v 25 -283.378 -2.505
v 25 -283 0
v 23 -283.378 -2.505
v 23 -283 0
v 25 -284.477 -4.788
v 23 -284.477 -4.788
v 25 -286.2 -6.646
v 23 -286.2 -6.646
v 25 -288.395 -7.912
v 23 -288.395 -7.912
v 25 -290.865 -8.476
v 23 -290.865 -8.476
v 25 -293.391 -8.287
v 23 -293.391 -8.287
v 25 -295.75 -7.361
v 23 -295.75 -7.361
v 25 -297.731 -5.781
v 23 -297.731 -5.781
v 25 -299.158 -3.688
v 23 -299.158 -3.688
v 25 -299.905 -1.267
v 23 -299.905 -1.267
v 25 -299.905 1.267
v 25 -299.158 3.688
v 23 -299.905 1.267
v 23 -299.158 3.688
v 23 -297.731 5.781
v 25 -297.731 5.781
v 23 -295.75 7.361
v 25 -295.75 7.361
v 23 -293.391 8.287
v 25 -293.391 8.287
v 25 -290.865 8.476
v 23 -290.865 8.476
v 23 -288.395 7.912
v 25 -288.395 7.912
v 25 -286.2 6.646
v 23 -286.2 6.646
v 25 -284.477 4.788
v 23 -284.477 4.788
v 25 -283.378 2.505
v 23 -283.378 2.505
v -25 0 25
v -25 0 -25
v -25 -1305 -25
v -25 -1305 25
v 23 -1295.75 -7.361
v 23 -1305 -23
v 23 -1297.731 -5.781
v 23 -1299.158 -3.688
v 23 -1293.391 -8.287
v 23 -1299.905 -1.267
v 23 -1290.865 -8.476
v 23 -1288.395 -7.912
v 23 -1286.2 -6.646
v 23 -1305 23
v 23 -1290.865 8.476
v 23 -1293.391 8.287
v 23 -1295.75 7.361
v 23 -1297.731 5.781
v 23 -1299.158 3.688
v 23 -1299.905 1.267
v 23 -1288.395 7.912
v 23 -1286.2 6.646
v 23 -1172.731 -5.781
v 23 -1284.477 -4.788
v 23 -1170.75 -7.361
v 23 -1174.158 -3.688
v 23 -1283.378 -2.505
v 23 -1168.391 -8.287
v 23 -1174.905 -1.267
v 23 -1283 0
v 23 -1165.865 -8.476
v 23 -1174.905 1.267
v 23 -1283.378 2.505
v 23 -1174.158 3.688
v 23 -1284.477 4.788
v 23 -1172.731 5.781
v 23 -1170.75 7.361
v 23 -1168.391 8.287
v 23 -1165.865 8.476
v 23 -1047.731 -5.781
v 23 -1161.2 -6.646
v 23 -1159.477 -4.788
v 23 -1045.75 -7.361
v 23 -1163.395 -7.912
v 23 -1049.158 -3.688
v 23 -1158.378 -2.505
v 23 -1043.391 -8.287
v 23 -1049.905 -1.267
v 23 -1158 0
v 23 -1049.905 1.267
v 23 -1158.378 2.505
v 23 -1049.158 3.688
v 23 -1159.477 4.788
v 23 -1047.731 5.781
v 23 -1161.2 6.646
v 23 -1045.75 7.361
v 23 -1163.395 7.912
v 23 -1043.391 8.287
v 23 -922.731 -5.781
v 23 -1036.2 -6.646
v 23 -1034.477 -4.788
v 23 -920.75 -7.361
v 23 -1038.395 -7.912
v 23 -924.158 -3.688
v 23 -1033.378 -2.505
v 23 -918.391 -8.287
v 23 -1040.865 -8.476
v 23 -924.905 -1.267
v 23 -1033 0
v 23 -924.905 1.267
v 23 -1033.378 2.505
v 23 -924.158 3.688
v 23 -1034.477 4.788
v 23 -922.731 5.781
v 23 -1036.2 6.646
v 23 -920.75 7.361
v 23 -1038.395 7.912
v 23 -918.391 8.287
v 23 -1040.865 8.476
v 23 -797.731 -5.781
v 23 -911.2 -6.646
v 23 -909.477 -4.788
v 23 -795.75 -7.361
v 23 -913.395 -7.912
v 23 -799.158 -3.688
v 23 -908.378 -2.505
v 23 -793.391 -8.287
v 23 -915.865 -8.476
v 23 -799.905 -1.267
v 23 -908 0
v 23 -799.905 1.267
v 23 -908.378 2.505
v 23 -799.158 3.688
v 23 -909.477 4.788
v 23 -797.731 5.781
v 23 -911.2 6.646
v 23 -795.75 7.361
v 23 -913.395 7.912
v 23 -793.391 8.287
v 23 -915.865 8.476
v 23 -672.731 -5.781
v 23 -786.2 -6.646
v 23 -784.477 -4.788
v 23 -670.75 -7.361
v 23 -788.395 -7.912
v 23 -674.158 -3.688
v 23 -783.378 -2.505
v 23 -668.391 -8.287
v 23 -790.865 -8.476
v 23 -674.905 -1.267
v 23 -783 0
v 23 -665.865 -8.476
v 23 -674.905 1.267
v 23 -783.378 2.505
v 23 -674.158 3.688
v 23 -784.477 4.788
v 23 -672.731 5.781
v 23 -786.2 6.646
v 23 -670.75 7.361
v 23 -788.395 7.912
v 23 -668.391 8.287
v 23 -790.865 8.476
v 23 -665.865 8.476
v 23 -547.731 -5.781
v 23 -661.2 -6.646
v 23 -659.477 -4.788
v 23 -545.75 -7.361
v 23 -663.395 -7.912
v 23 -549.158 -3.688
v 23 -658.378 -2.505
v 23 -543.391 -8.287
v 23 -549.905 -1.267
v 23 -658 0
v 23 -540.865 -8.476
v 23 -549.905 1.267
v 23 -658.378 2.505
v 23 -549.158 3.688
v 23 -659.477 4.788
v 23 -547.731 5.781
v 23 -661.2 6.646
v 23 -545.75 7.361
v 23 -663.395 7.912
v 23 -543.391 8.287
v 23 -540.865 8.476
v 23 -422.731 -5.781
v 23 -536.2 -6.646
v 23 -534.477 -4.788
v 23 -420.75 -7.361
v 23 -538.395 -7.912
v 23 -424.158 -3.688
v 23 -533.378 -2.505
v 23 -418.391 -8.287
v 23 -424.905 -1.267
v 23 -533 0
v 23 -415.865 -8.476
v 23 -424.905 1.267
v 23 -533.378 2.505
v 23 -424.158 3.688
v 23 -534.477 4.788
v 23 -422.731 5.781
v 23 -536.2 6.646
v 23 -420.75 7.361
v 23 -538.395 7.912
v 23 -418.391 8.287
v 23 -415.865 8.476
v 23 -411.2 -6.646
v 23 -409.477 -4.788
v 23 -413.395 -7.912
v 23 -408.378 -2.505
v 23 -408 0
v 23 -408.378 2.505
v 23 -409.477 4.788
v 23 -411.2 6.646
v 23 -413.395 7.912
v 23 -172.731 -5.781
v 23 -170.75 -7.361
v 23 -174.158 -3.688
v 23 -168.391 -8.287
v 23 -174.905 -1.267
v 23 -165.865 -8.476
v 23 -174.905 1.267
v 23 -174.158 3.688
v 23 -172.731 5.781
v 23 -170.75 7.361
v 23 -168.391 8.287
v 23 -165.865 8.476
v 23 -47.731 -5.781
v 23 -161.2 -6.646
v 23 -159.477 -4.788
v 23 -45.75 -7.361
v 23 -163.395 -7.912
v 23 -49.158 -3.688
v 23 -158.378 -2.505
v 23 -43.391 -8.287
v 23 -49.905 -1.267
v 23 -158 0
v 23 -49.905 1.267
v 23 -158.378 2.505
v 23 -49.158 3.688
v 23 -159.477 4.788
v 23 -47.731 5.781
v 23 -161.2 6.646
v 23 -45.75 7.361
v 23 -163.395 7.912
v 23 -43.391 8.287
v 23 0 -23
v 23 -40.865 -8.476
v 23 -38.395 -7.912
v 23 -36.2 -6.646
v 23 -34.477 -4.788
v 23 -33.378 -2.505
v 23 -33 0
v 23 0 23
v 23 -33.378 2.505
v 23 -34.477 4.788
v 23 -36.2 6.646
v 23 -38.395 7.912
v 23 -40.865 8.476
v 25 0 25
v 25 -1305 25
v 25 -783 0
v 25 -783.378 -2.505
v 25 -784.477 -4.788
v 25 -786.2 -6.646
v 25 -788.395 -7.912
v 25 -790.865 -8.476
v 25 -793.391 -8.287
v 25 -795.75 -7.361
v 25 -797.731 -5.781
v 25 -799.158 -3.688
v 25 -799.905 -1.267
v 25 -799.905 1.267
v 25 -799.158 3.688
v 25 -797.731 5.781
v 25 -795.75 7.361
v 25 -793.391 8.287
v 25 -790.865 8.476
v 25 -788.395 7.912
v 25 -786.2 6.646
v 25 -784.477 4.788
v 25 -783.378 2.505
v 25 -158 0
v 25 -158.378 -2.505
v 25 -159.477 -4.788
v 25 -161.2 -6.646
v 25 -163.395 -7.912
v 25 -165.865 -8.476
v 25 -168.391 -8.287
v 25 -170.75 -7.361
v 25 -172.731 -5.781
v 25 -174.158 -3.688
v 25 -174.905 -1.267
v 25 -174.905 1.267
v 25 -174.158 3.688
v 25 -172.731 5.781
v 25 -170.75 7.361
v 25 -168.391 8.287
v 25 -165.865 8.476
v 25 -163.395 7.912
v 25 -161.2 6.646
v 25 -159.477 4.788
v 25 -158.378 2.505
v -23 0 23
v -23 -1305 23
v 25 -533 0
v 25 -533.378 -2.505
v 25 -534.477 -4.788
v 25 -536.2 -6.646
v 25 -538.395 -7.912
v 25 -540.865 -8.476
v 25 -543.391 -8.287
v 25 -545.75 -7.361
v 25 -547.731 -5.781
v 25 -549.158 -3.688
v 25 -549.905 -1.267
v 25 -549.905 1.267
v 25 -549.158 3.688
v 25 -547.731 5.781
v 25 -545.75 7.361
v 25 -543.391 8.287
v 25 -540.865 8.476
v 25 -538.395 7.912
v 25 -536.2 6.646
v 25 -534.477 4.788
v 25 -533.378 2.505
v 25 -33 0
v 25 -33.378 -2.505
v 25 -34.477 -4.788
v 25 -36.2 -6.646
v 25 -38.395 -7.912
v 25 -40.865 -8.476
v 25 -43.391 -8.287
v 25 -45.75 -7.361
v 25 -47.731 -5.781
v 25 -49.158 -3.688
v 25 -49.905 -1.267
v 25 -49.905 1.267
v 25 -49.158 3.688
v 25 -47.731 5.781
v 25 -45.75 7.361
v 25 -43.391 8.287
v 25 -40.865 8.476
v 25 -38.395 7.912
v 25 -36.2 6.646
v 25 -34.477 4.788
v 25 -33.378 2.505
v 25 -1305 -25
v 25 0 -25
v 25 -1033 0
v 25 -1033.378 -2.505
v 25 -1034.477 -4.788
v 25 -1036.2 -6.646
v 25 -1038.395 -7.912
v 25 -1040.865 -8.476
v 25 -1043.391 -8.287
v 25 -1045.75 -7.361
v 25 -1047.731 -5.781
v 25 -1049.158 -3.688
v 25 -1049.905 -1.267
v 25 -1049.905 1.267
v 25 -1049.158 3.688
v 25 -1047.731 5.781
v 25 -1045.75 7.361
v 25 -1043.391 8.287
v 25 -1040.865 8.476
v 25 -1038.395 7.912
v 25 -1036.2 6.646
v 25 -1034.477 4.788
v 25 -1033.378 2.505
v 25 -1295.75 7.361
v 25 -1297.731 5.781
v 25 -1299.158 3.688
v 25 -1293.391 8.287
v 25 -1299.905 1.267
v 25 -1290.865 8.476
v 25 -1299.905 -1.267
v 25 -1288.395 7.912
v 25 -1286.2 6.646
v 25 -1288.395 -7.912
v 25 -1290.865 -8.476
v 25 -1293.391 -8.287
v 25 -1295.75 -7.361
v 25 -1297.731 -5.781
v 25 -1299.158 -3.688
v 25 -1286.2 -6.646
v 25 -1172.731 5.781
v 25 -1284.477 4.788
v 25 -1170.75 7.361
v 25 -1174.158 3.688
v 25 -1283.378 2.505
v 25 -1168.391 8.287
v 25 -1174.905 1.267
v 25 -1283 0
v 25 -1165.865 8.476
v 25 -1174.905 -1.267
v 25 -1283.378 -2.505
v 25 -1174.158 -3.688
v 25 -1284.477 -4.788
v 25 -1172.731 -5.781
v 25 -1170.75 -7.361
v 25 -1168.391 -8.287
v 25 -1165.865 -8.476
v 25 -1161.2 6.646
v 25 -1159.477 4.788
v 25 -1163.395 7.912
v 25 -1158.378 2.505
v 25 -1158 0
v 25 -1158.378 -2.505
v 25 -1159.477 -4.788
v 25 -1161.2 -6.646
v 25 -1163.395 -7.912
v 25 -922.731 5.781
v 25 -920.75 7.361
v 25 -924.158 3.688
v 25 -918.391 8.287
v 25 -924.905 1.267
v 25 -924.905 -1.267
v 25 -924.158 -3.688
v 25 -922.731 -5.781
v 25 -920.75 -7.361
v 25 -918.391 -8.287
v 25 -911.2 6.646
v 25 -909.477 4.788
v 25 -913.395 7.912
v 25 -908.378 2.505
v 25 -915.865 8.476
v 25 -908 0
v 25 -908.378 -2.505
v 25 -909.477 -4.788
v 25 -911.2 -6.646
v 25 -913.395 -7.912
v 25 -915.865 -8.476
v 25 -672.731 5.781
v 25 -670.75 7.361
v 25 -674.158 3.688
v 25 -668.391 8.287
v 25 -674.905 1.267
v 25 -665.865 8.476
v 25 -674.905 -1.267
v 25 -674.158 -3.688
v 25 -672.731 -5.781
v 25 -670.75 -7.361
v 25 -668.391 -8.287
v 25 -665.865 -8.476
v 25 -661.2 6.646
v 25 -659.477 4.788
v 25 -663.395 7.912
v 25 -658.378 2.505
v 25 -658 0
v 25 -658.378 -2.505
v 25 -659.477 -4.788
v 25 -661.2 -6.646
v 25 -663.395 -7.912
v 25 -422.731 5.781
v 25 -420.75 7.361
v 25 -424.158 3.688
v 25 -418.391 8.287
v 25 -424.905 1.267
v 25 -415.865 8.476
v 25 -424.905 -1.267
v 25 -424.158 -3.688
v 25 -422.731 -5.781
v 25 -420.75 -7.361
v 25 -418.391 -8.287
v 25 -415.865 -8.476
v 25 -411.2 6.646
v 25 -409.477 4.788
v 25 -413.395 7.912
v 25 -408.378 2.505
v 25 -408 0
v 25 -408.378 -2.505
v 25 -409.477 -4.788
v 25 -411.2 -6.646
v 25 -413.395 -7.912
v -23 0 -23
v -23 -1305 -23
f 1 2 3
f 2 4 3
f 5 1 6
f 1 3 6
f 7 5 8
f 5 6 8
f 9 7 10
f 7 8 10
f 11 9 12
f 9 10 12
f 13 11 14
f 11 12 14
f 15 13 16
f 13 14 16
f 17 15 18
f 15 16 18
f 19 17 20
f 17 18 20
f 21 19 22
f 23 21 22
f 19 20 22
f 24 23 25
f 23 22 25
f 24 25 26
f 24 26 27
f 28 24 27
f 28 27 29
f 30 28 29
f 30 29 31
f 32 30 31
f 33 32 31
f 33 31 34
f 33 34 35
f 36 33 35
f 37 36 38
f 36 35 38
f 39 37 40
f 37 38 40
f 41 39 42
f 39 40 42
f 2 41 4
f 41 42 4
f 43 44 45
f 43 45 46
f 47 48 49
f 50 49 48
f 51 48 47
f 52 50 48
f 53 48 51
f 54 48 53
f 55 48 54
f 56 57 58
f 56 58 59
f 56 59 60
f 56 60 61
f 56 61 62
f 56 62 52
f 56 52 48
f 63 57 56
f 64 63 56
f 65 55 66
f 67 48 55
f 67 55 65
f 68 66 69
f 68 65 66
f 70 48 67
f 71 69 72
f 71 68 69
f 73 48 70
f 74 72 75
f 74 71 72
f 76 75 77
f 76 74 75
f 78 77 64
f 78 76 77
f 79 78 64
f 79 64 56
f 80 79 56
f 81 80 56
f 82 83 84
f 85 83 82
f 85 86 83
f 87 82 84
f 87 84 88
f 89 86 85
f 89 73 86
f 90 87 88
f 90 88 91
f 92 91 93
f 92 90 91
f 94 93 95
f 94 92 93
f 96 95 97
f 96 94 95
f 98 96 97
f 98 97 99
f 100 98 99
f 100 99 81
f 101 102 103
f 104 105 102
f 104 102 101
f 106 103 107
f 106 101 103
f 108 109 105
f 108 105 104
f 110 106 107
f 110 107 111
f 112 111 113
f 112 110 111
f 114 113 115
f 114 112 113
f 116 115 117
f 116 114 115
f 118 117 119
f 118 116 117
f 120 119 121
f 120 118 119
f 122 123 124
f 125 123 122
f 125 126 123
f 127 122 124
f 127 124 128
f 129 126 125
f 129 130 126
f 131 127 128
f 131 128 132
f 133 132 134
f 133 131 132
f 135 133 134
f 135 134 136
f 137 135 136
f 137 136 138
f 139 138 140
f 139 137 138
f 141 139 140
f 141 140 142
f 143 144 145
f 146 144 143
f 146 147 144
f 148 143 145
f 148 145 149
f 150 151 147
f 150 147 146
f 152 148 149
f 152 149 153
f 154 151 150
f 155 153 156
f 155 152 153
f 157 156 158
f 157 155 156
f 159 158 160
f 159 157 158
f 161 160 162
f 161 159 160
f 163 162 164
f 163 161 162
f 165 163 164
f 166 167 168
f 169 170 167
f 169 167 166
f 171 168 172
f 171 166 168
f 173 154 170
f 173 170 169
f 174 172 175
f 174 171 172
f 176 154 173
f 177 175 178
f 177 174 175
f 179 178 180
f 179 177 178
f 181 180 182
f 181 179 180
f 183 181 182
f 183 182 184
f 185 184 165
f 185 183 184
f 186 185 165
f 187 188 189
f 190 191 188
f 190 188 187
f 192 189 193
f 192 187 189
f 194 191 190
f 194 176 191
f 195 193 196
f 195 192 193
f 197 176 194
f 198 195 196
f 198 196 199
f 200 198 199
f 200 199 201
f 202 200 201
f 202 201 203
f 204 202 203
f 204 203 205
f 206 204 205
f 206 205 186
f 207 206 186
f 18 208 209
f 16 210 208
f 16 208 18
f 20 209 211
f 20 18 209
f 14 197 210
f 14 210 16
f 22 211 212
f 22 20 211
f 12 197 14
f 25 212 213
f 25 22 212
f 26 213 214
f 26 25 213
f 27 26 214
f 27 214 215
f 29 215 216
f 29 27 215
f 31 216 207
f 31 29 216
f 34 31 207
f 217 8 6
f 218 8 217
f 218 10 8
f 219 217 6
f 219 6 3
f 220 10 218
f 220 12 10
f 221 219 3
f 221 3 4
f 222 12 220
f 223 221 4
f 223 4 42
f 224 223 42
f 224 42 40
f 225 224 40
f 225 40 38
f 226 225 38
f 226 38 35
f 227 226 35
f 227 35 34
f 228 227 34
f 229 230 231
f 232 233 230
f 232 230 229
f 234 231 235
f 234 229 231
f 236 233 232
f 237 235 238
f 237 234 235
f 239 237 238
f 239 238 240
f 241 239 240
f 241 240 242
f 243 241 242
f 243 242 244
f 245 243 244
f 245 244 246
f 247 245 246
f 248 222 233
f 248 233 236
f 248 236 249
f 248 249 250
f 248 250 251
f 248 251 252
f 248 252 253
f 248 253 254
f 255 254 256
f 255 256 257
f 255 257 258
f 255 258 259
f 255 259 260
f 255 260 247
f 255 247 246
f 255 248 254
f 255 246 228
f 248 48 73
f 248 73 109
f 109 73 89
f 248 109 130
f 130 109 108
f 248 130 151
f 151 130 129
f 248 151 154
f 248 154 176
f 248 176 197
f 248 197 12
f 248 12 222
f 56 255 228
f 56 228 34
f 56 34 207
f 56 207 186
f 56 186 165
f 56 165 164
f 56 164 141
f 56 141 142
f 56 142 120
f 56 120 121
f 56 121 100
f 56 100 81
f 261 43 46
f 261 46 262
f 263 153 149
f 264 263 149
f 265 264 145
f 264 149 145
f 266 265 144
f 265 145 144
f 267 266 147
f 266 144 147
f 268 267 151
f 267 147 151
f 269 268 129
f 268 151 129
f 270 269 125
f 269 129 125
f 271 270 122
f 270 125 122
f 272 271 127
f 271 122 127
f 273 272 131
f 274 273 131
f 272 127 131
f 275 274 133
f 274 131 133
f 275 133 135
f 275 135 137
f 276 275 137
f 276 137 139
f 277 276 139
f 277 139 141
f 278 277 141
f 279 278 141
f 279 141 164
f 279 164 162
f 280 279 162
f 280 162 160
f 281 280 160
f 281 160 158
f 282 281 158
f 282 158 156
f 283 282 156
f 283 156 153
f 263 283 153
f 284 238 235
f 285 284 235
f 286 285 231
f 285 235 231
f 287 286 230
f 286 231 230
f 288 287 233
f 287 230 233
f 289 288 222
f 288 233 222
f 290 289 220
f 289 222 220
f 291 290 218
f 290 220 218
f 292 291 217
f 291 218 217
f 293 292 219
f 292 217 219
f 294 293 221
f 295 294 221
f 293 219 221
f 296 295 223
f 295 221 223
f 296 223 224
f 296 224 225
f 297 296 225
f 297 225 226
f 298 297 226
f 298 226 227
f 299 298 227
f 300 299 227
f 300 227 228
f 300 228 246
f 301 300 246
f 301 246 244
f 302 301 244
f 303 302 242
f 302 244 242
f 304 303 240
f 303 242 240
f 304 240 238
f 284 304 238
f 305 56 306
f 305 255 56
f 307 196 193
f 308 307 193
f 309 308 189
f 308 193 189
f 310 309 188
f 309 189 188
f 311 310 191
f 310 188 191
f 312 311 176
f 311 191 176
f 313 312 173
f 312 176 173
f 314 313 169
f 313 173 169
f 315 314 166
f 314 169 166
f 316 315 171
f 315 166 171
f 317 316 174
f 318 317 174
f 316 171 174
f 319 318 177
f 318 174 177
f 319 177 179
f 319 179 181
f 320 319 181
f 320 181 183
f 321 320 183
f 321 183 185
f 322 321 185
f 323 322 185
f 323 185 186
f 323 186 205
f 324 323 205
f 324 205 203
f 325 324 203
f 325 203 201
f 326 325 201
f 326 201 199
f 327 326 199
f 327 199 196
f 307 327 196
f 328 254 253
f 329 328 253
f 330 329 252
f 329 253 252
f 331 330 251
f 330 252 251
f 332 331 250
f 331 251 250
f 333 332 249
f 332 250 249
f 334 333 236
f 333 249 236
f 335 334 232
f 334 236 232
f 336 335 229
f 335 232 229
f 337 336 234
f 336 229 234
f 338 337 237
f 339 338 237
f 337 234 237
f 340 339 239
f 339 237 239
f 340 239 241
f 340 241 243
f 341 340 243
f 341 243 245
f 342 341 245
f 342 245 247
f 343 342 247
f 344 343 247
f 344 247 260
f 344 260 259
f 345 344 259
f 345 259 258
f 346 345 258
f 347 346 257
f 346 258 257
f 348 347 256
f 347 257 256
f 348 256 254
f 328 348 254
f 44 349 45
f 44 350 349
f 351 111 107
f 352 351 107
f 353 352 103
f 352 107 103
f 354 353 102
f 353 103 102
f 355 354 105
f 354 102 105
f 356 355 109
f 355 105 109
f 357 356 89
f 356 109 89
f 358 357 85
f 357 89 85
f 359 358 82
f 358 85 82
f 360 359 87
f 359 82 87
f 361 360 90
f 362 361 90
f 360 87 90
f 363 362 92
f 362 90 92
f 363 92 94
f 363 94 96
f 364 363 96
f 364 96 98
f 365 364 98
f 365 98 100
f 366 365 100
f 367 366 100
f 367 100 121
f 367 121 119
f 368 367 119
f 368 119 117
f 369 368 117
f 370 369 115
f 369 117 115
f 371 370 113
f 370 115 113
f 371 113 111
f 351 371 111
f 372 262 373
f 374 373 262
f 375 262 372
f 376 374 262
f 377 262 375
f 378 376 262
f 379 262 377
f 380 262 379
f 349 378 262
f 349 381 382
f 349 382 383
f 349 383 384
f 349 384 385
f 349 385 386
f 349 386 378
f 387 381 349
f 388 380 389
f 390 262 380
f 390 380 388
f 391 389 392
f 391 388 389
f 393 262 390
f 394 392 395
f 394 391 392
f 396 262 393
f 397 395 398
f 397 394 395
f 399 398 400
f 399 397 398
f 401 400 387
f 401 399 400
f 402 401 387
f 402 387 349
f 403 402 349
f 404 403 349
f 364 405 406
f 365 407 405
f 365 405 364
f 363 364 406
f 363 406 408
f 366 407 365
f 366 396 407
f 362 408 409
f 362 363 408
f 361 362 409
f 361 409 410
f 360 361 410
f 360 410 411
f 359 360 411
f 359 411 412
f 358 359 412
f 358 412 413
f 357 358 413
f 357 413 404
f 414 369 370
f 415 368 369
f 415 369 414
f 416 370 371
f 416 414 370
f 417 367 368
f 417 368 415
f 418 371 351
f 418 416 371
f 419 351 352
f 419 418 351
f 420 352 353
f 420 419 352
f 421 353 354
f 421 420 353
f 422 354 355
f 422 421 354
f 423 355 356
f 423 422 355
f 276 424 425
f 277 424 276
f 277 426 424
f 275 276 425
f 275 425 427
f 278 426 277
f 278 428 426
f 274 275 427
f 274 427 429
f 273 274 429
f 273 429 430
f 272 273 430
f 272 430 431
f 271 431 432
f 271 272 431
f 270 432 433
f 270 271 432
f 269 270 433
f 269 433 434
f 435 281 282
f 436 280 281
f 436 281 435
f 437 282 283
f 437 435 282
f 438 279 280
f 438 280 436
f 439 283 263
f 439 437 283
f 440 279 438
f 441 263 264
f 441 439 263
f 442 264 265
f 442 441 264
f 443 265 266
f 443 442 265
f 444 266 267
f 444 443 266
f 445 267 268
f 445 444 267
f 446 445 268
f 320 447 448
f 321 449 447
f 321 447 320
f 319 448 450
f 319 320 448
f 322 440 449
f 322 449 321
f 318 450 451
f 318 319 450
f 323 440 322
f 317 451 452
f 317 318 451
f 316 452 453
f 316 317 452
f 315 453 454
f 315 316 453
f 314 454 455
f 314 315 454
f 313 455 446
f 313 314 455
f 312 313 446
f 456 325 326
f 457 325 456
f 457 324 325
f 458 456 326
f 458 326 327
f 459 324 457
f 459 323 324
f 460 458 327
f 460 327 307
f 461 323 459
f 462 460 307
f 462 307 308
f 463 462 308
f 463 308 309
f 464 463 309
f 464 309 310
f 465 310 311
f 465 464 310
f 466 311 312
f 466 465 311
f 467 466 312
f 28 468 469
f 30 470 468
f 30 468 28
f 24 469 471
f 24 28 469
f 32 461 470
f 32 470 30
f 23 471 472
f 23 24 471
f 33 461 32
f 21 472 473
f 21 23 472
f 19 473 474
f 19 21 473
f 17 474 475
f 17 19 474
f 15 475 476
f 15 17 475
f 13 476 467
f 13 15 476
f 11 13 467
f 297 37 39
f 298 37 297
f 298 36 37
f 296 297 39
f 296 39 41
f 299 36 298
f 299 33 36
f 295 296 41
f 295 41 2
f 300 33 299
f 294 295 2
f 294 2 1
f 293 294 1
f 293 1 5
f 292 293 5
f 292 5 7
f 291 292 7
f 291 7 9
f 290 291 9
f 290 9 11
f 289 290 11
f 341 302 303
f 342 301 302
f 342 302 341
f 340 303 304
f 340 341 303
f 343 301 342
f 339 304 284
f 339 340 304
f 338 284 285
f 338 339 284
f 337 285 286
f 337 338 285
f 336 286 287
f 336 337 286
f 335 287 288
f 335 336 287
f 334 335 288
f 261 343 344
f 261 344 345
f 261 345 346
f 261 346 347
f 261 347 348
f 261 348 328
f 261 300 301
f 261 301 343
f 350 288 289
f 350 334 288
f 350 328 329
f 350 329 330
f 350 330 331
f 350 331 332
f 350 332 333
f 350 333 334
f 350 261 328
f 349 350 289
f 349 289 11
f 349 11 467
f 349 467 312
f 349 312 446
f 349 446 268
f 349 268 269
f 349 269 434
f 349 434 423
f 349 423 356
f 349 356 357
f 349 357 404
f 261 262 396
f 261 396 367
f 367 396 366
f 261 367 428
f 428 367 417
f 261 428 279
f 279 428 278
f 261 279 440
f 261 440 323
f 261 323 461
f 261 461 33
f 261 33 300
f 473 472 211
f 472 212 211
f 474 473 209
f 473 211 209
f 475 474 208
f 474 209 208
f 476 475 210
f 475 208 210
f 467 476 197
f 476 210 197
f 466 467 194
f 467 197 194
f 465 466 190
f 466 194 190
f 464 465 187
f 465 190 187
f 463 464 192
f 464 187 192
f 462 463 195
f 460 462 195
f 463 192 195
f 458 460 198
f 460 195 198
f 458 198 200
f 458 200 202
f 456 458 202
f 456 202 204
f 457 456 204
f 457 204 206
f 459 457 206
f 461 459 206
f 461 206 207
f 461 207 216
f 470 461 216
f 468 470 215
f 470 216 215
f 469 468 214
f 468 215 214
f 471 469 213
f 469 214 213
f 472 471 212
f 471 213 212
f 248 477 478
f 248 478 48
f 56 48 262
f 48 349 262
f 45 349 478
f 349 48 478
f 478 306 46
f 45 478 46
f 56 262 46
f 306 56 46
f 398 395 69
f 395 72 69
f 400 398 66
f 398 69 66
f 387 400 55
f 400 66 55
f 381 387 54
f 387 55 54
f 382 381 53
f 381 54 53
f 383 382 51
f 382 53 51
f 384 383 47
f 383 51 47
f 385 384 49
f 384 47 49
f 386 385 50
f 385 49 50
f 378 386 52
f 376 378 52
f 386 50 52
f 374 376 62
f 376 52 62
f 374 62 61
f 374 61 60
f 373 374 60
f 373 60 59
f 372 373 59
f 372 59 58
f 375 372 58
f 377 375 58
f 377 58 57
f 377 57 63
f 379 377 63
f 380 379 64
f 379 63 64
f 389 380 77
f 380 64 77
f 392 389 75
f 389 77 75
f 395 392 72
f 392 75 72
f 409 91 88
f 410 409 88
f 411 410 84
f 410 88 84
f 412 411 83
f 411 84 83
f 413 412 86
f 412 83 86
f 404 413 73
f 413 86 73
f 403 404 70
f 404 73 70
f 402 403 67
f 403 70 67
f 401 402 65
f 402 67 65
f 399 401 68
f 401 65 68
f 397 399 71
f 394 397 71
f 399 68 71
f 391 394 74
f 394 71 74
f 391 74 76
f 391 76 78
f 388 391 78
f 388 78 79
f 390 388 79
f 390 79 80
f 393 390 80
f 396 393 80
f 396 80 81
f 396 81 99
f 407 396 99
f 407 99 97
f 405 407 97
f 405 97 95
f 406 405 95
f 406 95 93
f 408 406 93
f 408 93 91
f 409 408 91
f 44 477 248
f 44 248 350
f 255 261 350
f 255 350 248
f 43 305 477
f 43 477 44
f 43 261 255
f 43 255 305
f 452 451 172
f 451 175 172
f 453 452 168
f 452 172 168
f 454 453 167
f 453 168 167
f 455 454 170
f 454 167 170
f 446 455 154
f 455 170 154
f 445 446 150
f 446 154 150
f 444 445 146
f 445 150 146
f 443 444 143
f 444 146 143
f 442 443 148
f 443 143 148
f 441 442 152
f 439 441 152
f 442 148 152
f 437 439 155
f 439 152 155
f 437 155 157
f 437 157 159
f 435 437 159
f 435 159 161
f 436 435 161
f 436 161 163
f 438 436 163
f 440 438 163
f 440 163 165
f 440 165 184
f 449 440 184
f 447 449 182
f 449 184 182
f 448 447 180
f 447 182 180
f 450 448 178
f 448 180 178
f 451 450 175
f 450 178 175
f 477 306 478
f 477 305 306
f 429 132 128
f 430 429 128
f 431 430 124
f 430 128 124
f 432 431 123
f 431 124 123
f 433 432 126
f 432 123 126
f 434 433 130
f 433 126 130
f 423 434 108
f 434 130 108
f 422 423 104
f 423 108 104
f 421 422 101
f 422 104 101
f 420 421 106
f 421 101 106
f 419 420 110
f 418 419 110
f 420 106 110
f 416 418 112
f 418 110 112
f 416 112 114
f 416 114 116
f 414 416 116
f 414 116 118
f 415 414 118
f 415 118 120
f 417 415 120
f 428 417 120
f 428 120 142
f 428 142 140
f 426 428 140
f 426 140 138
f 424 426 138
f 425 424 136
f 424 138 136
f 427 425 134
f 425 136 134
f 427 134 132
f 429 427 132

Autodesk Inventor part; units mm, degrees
ref_plane "YZ Plane" through (0, 0, 0) normal (1, 0, 0) x (0, 1, 0)
ref_plane "XZ Plane" through (0, 0, 0) normal (0, 1, 0) x (-1, 0, 0)
ref_plane "XY Plane" through (0, 0, 0) normal (0, 0, 1) x (1, 0, 0)
sketch "Sketch9" plane through (0, 0, 0) normal (0, 1, 0) x (-1, 0, 0)
  line L0 (25, 25) -> (-25, 25)
  line L1 (-25, 25) -> (-25, -25)
  line L2 (-25, -25) -> (25, -25)
  line L3 (25, -25) -> (25, 25)
  line L4 (25, 25) -> (-25, -25) construction
  line L5 (-25, 25) -> (25, -25) construction
  line L6 (-23, 23) -> (23, 23)
  line L7 (23, 23) -> (23, -23)
  line L8 (23, -23) -> (-23, -23)
  line L9 (-23, -23) -> (-23, 23)
  point P0 (0, 0)
  dimension "d172" = 50
  dimension "d173" = 50
  dimension "d174" = 2
extrude "Extrusion3" add sketch "Sketch9" against normal blind 1305
sketch "Sketch10" plane through (0, 0, 0) normal (1, 0, 0) x (0, 1, 0)
  line L0 (0, 25) -> (0, -25) construction
  line L1 (0, 25) -> (-1305, 25) construction
  line L2 (-1305, -25) -> (-1305, 25) construction
  line L3 (0, -25) -> (-1305, -25) construction
  line L4 (-1300, 8.5) -> (-1283, 8.5)
  line L5 (-1283, 8.5) -> (-1283, -8.5)
  line L6 (-1283, -8.5) -> (-1300, -8.5)
  line L7 (-1300, -8.5) -> (-1300, 8.5)
  line L8 (-1300, 8.5) -> (-1283, -8.5) construction
  line L9 (-1283, 8.5) -> (-1300, -8.5) construction
  circle A0 centre (-1291.5, 0) radius 8.5
  line L10 (0, 25) -> (0, -25) projected
  point P0 (0, 0)
  point P1 (0, 0)
  point P2 (-1305, 0)
  dimension "d177" = 17
  dimension "d178" = 17
  dimension "d191" = 5
extrude "Extrusion4" cut sketch "Sketch10" along normal through all contours A0
pattern_linear "Rectangular Pattern4" count 11 spacing 125 along (0, 1, 0) of "Extrusion4"
properties part number "TKS 3532 FDS WAY tube2" material "Stainless Steel"
